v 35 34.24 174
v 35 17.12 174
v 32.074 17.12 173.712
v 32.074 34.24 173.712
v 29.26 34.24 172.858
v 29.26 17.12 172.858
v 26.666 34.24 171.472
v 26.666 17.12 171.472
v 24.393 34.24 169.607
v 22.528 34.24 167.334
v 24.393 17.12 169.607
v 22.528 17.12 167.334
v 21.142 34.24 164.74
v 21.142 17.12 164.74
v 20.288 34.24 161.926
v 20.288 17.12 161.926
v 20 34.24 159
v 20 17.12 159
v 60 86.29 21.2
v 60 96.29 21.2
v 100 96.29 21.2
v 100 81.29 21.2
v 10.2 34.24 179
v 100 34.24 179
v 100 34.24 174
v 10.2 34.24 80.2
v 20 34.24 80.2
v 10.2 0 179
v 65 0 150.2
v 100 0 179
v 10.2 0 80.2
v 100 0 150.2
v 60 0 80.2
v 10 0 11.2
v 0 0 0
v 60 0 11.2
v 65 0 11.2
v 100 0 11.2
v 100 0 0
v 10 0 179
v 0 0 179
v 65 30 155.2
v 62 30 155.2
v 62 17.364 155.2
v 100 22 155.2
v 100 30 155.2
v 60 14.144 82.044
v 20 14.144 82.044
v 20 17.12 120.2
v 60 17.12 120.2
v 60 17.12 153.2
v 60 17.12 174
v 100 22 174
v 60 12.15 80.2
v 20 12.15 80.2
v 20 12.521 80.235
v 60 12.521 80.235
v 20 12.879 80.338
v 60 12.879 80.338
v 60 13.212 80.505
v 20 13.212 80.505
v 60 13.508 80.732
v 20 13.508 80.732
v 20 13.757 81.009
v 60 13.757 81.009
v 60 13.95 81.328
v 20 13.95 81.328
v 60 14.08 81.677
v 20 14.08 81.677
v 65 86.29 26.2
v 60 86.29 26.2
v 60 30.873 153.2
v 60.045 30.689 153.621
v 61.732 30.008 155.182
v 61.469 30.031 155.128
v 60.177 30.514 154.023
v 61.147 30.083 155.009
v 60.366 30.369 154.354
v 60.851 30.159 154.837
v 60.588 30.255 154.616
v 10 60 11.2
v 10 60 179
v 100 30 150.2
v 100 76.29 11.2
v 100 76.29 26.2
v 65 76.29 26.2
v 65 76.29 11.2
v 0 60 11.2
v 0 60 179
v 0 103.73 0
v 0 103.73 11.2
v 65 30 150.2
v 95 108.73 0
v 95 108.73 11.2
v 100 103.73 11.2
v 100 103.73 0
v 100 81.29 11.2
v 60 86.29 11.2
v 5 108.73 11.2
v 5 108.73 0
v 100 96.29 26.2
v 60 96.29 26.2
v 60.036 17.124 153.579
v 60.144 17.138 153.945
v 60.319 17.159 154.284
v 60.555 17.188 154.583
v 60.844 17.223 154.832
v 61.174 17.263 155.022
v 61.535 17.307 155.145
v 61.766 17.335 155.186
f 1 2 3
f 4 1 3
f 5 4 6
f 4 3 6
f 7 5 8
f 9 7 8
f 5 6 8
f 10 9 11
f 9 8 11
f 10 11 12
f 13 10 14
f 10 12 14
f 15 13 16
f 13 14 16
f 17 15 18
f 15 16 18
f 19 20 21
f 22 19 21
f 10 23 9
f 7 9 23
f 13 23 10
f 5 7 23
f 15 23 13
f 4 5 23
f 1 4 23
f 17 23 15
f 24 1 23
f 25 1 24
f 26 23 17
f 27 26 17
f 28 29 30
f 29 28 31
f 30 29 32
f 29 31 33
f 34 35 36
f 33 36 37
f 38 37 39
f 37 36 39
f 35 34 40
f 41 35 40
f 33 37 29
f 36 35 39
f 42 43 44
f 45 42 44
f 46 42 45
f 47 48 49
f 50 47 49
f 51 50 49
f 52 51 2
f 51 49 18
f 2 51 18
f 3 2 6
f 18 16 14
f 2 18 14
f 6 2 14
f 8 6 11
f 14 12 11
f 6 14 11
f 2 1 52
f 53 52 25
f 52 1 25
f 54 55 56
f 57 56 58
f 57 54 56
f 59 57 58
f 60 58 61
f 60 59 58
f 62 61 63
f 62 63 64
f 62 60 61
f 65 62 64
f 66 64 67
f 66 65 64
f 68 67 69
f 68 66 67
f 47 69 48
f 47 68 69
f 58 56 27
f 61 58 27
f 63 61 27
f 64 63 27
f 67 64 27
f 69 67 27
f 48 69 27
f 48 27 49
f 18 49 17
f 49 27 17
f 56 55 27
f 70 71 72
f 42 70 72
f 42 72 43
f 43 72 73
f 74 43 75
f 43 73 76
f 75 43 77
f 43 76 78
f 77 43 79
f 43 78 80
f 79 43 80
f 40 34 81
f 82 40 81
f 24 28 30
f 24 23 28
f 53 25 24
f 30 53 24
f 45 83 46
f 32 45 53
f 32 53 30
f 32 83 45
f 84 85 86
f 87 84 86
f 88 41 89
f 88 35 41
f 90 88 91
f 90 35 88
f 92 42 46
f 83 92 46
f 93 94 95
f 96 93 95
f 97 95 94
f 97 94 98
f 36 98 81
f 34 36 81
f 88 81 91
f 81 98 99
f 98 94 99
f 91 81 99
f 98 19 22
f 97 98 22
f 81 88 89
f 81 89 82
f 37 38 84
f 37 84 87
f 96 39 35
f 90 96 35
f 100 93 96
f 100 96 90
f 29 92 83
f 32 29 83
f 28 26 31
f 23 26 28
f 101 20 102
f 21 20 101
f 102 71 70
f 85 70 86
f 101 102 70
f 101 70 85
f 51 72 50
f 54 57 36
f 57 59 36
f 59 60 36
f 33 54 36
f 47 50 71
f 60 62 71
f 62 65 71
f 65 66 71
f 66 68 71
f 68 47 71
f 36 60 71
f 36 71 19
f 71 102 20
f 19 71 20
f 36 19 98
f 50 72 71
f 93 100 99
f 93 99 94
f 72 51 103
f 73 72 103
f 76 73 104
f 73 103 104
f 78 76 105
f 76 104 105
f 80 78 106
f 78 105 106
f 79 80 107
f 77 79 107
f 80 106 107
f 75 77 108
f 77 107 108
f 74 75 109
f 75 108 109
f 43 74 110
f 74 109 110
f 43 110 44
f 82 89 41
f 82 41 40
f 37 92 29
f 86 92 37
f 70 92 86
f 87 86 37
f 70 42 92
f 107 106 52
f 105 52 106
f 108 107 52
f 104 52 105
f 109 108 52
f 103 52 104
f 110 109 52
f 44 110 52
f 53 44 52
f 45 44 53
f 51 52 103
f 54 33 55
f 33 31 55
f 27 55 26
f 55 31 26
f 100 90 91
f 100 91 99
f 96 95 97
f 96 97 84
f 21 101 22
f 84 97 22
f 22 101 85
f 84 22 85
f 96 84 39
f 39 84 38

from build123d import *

# Parameters (mm, degrees)
EXTRUDE_1_DEPTH  = 11.2
SKETCH_3_W       = 40
SKETCH_3_H       = 20
EXTRUDE_2_DEPTH  = 5
EXTRUDE_3_DEPTH  = 10
EXTRUDE_4_DEPTH  = 5
SKETCH_7_W       = 98.8
SKETCH_7_H       = 34.24
EXTRUDE_5_DEPTH  = 9.8
SKETCH_8_W       = 80
SKETCH_8_H       = 34.24
EXTRUDE_6_DEPTH  = 5
SKETCH_9_W       = 35
SKETCH_9_H       = 30
EXTRUDE_7_DEPTH  = 5
EXTRUDE_8_DEPTH  = 40
FILLET_1_R       = 2
EXTRUDE_9_REACH  = 25.8
SKETCH_14_W      = 10
SKETCH_14_H      = 60
EXTRUDE_12_DEPTH = 167.8
EXTRUDE_13_DEPTH = 17.12
FILLET_3_R       = 2


with BuildPart() as part:
    # 草图1 → 凸台-拉伸1 (new body)
    with BuildSketch(Plane.XY):
        Polygon((0, 103.73), (5, 108.73), (95, 108.73), (100, 103.73), (100, 0), (0, 0), align=None)
    extrude(amount=EXTRUDE_1_DEPTH)



with BuildPart() as body_2:
    # 草图3 → 凸台-拉伸2 (new body)
    with BuildSketch(Plane.XY.offset(21.2)):
        with Locations((80, 86.29)):
            Rectangle(SKETCH_3_W, SKETCH_3_H)
    extrude(amount=EXTRUDE_2_DEPTH)


with BuildPart() as part_1:
    add(part.part)

    add(body_2.part)  # 凸台-拉伸3 merges body 2
    # 草图5 → 凸台-拉伸3 (add)
    with BuildSketch(Plane(origin=(0, 0, 21.2), x_dir=(-1, 0, 0), z_dir=(0, 0, -1))):
        Polygon((-60, 86.29), (-100, 81.29), (-100, 76.29), (-60, 76.29), align=None)
    extrude(amount=EXTRUDE_3_DEPTH)

    # 草图6 → 凸台-拉伸4 (add)
    with BuildSketch(Plane.ZY.offset(-60)):
        Polygon((26.2, 86.29), (155.2, 30), (155.2, 0), (26.2, 0), (11.2, 0), (11.2, 76.29), (26.2, 76.29), align=None)
    extrude(amount=-EXTRUDE_4_DEPTH)

    # 草图9 → 凸台-拉伸7 (add)
    with BuildSketch(Plane.XY.offset(155.2)):
        with Locations((82.5, 15)):
            Rectangle(SKETCH_9_W, SKETCH_9_H)
    extrude(amount=-EXTRUDE_7_DEPTH)



with BuildPart() as body_2_2:
    # 草图7 → 凸台-拉伸5 (new body)
    with BuildSketch(Plane.ZY.offset(-10.2)):
        with Locations((129.6, 17.12)):
            Rectangle(SKETCH_7_W, SKETCH_7_H)
    extrude(amount=-EXTRUDE_5_DEPTH)

    # 草图8 → 凸台-拉伸6 (add)
    with BuildSketch(Plane.XY.offset(179)):
        with Locations((60, 17.12)):
            Rectangle(SKETCH_8_W, SKETCH_8_H)
    extrude(amount=-EXTRUDE_6_DEPTH)


with BuildPart() as part_2:
    add(part_1.part)

    add(body_2_2.part)  # 凸台-拉伸8 merges body 2 2
    # 草图11 → 凸台-拉伸8 (add)
    with BuildSketch(Plane(origin=(20, 0, 0), x_dir=(0, 0, -1), z_dir=(1, 0, 0))):
        Polygon((-80.2, 0), (-80.2, 14), (-120.2, 17.12), (-174, 17.12), (-174, 0), align=None)
    extrude(amount=EXTRUDE_8_DEPTH)

    # 圆角1
    fillet_1_edges = [part_2.edges().sort_by_distance(p)[0] for p in [
        (40, 14, 80.2),
    ]]
    fillet(fillet_1_edges, radius=FILLET_1_R)

    # 草图12 → 凸台-拉伸9 (add, up to next)
    with BuildSketch(Plane.XY.offset(155.2), mode=Mode.PRIVATE) as extrude_9_sk1:
        Polygon((60, 0), (60, 17.12), (100, 22), (100, 0), align=None)
    extrude_9_tool1 = extrude(extrude_9_sk1.sketch, amount=EXTRUDE_9_REACH, mode=Mode.PRIVATE) - part_2.part
    add(extrude_9_tool1.solids().sort_by_distance((80.831629, 9.830729, 155.2))[0])

    # 草图14 → 凸台-拉伸12 (add)
    with BuildSketch(Plane.XY.offset(11.2)):
        with Locations((5, 30)):
            Rectangle(SKETCH_14_W, SKETCH_14_H)
    extrude(amount=EXTRUDE_12_DEPTH)

    # 草图15 → 凸台-拉伸13 (add)
    with BuildSketch(Plane(origin=(0, 17.12, 0), x_dir=(1, 0, 0), z_dir=(0, 1, 0))):
        with BuildLine():
            Line((20, -159), (20, -174))
            Line((20, -174), (35, -174))
            ThreePointArc((35, -174), (24.393398282, -169.606601718), (20, -159))
        make_face()
    extrude(amount=EXTRUDE_13_DEPTH)

    # 圆角3
    fillet_3_edges = [part_2.edges().sort_by_distance(p)[0] for p in [
        (60, 23.56, 155.2),
    ]]
    fillet(fillet_3_edges, radius=FILLET_3_R)


solid = part_2.part
